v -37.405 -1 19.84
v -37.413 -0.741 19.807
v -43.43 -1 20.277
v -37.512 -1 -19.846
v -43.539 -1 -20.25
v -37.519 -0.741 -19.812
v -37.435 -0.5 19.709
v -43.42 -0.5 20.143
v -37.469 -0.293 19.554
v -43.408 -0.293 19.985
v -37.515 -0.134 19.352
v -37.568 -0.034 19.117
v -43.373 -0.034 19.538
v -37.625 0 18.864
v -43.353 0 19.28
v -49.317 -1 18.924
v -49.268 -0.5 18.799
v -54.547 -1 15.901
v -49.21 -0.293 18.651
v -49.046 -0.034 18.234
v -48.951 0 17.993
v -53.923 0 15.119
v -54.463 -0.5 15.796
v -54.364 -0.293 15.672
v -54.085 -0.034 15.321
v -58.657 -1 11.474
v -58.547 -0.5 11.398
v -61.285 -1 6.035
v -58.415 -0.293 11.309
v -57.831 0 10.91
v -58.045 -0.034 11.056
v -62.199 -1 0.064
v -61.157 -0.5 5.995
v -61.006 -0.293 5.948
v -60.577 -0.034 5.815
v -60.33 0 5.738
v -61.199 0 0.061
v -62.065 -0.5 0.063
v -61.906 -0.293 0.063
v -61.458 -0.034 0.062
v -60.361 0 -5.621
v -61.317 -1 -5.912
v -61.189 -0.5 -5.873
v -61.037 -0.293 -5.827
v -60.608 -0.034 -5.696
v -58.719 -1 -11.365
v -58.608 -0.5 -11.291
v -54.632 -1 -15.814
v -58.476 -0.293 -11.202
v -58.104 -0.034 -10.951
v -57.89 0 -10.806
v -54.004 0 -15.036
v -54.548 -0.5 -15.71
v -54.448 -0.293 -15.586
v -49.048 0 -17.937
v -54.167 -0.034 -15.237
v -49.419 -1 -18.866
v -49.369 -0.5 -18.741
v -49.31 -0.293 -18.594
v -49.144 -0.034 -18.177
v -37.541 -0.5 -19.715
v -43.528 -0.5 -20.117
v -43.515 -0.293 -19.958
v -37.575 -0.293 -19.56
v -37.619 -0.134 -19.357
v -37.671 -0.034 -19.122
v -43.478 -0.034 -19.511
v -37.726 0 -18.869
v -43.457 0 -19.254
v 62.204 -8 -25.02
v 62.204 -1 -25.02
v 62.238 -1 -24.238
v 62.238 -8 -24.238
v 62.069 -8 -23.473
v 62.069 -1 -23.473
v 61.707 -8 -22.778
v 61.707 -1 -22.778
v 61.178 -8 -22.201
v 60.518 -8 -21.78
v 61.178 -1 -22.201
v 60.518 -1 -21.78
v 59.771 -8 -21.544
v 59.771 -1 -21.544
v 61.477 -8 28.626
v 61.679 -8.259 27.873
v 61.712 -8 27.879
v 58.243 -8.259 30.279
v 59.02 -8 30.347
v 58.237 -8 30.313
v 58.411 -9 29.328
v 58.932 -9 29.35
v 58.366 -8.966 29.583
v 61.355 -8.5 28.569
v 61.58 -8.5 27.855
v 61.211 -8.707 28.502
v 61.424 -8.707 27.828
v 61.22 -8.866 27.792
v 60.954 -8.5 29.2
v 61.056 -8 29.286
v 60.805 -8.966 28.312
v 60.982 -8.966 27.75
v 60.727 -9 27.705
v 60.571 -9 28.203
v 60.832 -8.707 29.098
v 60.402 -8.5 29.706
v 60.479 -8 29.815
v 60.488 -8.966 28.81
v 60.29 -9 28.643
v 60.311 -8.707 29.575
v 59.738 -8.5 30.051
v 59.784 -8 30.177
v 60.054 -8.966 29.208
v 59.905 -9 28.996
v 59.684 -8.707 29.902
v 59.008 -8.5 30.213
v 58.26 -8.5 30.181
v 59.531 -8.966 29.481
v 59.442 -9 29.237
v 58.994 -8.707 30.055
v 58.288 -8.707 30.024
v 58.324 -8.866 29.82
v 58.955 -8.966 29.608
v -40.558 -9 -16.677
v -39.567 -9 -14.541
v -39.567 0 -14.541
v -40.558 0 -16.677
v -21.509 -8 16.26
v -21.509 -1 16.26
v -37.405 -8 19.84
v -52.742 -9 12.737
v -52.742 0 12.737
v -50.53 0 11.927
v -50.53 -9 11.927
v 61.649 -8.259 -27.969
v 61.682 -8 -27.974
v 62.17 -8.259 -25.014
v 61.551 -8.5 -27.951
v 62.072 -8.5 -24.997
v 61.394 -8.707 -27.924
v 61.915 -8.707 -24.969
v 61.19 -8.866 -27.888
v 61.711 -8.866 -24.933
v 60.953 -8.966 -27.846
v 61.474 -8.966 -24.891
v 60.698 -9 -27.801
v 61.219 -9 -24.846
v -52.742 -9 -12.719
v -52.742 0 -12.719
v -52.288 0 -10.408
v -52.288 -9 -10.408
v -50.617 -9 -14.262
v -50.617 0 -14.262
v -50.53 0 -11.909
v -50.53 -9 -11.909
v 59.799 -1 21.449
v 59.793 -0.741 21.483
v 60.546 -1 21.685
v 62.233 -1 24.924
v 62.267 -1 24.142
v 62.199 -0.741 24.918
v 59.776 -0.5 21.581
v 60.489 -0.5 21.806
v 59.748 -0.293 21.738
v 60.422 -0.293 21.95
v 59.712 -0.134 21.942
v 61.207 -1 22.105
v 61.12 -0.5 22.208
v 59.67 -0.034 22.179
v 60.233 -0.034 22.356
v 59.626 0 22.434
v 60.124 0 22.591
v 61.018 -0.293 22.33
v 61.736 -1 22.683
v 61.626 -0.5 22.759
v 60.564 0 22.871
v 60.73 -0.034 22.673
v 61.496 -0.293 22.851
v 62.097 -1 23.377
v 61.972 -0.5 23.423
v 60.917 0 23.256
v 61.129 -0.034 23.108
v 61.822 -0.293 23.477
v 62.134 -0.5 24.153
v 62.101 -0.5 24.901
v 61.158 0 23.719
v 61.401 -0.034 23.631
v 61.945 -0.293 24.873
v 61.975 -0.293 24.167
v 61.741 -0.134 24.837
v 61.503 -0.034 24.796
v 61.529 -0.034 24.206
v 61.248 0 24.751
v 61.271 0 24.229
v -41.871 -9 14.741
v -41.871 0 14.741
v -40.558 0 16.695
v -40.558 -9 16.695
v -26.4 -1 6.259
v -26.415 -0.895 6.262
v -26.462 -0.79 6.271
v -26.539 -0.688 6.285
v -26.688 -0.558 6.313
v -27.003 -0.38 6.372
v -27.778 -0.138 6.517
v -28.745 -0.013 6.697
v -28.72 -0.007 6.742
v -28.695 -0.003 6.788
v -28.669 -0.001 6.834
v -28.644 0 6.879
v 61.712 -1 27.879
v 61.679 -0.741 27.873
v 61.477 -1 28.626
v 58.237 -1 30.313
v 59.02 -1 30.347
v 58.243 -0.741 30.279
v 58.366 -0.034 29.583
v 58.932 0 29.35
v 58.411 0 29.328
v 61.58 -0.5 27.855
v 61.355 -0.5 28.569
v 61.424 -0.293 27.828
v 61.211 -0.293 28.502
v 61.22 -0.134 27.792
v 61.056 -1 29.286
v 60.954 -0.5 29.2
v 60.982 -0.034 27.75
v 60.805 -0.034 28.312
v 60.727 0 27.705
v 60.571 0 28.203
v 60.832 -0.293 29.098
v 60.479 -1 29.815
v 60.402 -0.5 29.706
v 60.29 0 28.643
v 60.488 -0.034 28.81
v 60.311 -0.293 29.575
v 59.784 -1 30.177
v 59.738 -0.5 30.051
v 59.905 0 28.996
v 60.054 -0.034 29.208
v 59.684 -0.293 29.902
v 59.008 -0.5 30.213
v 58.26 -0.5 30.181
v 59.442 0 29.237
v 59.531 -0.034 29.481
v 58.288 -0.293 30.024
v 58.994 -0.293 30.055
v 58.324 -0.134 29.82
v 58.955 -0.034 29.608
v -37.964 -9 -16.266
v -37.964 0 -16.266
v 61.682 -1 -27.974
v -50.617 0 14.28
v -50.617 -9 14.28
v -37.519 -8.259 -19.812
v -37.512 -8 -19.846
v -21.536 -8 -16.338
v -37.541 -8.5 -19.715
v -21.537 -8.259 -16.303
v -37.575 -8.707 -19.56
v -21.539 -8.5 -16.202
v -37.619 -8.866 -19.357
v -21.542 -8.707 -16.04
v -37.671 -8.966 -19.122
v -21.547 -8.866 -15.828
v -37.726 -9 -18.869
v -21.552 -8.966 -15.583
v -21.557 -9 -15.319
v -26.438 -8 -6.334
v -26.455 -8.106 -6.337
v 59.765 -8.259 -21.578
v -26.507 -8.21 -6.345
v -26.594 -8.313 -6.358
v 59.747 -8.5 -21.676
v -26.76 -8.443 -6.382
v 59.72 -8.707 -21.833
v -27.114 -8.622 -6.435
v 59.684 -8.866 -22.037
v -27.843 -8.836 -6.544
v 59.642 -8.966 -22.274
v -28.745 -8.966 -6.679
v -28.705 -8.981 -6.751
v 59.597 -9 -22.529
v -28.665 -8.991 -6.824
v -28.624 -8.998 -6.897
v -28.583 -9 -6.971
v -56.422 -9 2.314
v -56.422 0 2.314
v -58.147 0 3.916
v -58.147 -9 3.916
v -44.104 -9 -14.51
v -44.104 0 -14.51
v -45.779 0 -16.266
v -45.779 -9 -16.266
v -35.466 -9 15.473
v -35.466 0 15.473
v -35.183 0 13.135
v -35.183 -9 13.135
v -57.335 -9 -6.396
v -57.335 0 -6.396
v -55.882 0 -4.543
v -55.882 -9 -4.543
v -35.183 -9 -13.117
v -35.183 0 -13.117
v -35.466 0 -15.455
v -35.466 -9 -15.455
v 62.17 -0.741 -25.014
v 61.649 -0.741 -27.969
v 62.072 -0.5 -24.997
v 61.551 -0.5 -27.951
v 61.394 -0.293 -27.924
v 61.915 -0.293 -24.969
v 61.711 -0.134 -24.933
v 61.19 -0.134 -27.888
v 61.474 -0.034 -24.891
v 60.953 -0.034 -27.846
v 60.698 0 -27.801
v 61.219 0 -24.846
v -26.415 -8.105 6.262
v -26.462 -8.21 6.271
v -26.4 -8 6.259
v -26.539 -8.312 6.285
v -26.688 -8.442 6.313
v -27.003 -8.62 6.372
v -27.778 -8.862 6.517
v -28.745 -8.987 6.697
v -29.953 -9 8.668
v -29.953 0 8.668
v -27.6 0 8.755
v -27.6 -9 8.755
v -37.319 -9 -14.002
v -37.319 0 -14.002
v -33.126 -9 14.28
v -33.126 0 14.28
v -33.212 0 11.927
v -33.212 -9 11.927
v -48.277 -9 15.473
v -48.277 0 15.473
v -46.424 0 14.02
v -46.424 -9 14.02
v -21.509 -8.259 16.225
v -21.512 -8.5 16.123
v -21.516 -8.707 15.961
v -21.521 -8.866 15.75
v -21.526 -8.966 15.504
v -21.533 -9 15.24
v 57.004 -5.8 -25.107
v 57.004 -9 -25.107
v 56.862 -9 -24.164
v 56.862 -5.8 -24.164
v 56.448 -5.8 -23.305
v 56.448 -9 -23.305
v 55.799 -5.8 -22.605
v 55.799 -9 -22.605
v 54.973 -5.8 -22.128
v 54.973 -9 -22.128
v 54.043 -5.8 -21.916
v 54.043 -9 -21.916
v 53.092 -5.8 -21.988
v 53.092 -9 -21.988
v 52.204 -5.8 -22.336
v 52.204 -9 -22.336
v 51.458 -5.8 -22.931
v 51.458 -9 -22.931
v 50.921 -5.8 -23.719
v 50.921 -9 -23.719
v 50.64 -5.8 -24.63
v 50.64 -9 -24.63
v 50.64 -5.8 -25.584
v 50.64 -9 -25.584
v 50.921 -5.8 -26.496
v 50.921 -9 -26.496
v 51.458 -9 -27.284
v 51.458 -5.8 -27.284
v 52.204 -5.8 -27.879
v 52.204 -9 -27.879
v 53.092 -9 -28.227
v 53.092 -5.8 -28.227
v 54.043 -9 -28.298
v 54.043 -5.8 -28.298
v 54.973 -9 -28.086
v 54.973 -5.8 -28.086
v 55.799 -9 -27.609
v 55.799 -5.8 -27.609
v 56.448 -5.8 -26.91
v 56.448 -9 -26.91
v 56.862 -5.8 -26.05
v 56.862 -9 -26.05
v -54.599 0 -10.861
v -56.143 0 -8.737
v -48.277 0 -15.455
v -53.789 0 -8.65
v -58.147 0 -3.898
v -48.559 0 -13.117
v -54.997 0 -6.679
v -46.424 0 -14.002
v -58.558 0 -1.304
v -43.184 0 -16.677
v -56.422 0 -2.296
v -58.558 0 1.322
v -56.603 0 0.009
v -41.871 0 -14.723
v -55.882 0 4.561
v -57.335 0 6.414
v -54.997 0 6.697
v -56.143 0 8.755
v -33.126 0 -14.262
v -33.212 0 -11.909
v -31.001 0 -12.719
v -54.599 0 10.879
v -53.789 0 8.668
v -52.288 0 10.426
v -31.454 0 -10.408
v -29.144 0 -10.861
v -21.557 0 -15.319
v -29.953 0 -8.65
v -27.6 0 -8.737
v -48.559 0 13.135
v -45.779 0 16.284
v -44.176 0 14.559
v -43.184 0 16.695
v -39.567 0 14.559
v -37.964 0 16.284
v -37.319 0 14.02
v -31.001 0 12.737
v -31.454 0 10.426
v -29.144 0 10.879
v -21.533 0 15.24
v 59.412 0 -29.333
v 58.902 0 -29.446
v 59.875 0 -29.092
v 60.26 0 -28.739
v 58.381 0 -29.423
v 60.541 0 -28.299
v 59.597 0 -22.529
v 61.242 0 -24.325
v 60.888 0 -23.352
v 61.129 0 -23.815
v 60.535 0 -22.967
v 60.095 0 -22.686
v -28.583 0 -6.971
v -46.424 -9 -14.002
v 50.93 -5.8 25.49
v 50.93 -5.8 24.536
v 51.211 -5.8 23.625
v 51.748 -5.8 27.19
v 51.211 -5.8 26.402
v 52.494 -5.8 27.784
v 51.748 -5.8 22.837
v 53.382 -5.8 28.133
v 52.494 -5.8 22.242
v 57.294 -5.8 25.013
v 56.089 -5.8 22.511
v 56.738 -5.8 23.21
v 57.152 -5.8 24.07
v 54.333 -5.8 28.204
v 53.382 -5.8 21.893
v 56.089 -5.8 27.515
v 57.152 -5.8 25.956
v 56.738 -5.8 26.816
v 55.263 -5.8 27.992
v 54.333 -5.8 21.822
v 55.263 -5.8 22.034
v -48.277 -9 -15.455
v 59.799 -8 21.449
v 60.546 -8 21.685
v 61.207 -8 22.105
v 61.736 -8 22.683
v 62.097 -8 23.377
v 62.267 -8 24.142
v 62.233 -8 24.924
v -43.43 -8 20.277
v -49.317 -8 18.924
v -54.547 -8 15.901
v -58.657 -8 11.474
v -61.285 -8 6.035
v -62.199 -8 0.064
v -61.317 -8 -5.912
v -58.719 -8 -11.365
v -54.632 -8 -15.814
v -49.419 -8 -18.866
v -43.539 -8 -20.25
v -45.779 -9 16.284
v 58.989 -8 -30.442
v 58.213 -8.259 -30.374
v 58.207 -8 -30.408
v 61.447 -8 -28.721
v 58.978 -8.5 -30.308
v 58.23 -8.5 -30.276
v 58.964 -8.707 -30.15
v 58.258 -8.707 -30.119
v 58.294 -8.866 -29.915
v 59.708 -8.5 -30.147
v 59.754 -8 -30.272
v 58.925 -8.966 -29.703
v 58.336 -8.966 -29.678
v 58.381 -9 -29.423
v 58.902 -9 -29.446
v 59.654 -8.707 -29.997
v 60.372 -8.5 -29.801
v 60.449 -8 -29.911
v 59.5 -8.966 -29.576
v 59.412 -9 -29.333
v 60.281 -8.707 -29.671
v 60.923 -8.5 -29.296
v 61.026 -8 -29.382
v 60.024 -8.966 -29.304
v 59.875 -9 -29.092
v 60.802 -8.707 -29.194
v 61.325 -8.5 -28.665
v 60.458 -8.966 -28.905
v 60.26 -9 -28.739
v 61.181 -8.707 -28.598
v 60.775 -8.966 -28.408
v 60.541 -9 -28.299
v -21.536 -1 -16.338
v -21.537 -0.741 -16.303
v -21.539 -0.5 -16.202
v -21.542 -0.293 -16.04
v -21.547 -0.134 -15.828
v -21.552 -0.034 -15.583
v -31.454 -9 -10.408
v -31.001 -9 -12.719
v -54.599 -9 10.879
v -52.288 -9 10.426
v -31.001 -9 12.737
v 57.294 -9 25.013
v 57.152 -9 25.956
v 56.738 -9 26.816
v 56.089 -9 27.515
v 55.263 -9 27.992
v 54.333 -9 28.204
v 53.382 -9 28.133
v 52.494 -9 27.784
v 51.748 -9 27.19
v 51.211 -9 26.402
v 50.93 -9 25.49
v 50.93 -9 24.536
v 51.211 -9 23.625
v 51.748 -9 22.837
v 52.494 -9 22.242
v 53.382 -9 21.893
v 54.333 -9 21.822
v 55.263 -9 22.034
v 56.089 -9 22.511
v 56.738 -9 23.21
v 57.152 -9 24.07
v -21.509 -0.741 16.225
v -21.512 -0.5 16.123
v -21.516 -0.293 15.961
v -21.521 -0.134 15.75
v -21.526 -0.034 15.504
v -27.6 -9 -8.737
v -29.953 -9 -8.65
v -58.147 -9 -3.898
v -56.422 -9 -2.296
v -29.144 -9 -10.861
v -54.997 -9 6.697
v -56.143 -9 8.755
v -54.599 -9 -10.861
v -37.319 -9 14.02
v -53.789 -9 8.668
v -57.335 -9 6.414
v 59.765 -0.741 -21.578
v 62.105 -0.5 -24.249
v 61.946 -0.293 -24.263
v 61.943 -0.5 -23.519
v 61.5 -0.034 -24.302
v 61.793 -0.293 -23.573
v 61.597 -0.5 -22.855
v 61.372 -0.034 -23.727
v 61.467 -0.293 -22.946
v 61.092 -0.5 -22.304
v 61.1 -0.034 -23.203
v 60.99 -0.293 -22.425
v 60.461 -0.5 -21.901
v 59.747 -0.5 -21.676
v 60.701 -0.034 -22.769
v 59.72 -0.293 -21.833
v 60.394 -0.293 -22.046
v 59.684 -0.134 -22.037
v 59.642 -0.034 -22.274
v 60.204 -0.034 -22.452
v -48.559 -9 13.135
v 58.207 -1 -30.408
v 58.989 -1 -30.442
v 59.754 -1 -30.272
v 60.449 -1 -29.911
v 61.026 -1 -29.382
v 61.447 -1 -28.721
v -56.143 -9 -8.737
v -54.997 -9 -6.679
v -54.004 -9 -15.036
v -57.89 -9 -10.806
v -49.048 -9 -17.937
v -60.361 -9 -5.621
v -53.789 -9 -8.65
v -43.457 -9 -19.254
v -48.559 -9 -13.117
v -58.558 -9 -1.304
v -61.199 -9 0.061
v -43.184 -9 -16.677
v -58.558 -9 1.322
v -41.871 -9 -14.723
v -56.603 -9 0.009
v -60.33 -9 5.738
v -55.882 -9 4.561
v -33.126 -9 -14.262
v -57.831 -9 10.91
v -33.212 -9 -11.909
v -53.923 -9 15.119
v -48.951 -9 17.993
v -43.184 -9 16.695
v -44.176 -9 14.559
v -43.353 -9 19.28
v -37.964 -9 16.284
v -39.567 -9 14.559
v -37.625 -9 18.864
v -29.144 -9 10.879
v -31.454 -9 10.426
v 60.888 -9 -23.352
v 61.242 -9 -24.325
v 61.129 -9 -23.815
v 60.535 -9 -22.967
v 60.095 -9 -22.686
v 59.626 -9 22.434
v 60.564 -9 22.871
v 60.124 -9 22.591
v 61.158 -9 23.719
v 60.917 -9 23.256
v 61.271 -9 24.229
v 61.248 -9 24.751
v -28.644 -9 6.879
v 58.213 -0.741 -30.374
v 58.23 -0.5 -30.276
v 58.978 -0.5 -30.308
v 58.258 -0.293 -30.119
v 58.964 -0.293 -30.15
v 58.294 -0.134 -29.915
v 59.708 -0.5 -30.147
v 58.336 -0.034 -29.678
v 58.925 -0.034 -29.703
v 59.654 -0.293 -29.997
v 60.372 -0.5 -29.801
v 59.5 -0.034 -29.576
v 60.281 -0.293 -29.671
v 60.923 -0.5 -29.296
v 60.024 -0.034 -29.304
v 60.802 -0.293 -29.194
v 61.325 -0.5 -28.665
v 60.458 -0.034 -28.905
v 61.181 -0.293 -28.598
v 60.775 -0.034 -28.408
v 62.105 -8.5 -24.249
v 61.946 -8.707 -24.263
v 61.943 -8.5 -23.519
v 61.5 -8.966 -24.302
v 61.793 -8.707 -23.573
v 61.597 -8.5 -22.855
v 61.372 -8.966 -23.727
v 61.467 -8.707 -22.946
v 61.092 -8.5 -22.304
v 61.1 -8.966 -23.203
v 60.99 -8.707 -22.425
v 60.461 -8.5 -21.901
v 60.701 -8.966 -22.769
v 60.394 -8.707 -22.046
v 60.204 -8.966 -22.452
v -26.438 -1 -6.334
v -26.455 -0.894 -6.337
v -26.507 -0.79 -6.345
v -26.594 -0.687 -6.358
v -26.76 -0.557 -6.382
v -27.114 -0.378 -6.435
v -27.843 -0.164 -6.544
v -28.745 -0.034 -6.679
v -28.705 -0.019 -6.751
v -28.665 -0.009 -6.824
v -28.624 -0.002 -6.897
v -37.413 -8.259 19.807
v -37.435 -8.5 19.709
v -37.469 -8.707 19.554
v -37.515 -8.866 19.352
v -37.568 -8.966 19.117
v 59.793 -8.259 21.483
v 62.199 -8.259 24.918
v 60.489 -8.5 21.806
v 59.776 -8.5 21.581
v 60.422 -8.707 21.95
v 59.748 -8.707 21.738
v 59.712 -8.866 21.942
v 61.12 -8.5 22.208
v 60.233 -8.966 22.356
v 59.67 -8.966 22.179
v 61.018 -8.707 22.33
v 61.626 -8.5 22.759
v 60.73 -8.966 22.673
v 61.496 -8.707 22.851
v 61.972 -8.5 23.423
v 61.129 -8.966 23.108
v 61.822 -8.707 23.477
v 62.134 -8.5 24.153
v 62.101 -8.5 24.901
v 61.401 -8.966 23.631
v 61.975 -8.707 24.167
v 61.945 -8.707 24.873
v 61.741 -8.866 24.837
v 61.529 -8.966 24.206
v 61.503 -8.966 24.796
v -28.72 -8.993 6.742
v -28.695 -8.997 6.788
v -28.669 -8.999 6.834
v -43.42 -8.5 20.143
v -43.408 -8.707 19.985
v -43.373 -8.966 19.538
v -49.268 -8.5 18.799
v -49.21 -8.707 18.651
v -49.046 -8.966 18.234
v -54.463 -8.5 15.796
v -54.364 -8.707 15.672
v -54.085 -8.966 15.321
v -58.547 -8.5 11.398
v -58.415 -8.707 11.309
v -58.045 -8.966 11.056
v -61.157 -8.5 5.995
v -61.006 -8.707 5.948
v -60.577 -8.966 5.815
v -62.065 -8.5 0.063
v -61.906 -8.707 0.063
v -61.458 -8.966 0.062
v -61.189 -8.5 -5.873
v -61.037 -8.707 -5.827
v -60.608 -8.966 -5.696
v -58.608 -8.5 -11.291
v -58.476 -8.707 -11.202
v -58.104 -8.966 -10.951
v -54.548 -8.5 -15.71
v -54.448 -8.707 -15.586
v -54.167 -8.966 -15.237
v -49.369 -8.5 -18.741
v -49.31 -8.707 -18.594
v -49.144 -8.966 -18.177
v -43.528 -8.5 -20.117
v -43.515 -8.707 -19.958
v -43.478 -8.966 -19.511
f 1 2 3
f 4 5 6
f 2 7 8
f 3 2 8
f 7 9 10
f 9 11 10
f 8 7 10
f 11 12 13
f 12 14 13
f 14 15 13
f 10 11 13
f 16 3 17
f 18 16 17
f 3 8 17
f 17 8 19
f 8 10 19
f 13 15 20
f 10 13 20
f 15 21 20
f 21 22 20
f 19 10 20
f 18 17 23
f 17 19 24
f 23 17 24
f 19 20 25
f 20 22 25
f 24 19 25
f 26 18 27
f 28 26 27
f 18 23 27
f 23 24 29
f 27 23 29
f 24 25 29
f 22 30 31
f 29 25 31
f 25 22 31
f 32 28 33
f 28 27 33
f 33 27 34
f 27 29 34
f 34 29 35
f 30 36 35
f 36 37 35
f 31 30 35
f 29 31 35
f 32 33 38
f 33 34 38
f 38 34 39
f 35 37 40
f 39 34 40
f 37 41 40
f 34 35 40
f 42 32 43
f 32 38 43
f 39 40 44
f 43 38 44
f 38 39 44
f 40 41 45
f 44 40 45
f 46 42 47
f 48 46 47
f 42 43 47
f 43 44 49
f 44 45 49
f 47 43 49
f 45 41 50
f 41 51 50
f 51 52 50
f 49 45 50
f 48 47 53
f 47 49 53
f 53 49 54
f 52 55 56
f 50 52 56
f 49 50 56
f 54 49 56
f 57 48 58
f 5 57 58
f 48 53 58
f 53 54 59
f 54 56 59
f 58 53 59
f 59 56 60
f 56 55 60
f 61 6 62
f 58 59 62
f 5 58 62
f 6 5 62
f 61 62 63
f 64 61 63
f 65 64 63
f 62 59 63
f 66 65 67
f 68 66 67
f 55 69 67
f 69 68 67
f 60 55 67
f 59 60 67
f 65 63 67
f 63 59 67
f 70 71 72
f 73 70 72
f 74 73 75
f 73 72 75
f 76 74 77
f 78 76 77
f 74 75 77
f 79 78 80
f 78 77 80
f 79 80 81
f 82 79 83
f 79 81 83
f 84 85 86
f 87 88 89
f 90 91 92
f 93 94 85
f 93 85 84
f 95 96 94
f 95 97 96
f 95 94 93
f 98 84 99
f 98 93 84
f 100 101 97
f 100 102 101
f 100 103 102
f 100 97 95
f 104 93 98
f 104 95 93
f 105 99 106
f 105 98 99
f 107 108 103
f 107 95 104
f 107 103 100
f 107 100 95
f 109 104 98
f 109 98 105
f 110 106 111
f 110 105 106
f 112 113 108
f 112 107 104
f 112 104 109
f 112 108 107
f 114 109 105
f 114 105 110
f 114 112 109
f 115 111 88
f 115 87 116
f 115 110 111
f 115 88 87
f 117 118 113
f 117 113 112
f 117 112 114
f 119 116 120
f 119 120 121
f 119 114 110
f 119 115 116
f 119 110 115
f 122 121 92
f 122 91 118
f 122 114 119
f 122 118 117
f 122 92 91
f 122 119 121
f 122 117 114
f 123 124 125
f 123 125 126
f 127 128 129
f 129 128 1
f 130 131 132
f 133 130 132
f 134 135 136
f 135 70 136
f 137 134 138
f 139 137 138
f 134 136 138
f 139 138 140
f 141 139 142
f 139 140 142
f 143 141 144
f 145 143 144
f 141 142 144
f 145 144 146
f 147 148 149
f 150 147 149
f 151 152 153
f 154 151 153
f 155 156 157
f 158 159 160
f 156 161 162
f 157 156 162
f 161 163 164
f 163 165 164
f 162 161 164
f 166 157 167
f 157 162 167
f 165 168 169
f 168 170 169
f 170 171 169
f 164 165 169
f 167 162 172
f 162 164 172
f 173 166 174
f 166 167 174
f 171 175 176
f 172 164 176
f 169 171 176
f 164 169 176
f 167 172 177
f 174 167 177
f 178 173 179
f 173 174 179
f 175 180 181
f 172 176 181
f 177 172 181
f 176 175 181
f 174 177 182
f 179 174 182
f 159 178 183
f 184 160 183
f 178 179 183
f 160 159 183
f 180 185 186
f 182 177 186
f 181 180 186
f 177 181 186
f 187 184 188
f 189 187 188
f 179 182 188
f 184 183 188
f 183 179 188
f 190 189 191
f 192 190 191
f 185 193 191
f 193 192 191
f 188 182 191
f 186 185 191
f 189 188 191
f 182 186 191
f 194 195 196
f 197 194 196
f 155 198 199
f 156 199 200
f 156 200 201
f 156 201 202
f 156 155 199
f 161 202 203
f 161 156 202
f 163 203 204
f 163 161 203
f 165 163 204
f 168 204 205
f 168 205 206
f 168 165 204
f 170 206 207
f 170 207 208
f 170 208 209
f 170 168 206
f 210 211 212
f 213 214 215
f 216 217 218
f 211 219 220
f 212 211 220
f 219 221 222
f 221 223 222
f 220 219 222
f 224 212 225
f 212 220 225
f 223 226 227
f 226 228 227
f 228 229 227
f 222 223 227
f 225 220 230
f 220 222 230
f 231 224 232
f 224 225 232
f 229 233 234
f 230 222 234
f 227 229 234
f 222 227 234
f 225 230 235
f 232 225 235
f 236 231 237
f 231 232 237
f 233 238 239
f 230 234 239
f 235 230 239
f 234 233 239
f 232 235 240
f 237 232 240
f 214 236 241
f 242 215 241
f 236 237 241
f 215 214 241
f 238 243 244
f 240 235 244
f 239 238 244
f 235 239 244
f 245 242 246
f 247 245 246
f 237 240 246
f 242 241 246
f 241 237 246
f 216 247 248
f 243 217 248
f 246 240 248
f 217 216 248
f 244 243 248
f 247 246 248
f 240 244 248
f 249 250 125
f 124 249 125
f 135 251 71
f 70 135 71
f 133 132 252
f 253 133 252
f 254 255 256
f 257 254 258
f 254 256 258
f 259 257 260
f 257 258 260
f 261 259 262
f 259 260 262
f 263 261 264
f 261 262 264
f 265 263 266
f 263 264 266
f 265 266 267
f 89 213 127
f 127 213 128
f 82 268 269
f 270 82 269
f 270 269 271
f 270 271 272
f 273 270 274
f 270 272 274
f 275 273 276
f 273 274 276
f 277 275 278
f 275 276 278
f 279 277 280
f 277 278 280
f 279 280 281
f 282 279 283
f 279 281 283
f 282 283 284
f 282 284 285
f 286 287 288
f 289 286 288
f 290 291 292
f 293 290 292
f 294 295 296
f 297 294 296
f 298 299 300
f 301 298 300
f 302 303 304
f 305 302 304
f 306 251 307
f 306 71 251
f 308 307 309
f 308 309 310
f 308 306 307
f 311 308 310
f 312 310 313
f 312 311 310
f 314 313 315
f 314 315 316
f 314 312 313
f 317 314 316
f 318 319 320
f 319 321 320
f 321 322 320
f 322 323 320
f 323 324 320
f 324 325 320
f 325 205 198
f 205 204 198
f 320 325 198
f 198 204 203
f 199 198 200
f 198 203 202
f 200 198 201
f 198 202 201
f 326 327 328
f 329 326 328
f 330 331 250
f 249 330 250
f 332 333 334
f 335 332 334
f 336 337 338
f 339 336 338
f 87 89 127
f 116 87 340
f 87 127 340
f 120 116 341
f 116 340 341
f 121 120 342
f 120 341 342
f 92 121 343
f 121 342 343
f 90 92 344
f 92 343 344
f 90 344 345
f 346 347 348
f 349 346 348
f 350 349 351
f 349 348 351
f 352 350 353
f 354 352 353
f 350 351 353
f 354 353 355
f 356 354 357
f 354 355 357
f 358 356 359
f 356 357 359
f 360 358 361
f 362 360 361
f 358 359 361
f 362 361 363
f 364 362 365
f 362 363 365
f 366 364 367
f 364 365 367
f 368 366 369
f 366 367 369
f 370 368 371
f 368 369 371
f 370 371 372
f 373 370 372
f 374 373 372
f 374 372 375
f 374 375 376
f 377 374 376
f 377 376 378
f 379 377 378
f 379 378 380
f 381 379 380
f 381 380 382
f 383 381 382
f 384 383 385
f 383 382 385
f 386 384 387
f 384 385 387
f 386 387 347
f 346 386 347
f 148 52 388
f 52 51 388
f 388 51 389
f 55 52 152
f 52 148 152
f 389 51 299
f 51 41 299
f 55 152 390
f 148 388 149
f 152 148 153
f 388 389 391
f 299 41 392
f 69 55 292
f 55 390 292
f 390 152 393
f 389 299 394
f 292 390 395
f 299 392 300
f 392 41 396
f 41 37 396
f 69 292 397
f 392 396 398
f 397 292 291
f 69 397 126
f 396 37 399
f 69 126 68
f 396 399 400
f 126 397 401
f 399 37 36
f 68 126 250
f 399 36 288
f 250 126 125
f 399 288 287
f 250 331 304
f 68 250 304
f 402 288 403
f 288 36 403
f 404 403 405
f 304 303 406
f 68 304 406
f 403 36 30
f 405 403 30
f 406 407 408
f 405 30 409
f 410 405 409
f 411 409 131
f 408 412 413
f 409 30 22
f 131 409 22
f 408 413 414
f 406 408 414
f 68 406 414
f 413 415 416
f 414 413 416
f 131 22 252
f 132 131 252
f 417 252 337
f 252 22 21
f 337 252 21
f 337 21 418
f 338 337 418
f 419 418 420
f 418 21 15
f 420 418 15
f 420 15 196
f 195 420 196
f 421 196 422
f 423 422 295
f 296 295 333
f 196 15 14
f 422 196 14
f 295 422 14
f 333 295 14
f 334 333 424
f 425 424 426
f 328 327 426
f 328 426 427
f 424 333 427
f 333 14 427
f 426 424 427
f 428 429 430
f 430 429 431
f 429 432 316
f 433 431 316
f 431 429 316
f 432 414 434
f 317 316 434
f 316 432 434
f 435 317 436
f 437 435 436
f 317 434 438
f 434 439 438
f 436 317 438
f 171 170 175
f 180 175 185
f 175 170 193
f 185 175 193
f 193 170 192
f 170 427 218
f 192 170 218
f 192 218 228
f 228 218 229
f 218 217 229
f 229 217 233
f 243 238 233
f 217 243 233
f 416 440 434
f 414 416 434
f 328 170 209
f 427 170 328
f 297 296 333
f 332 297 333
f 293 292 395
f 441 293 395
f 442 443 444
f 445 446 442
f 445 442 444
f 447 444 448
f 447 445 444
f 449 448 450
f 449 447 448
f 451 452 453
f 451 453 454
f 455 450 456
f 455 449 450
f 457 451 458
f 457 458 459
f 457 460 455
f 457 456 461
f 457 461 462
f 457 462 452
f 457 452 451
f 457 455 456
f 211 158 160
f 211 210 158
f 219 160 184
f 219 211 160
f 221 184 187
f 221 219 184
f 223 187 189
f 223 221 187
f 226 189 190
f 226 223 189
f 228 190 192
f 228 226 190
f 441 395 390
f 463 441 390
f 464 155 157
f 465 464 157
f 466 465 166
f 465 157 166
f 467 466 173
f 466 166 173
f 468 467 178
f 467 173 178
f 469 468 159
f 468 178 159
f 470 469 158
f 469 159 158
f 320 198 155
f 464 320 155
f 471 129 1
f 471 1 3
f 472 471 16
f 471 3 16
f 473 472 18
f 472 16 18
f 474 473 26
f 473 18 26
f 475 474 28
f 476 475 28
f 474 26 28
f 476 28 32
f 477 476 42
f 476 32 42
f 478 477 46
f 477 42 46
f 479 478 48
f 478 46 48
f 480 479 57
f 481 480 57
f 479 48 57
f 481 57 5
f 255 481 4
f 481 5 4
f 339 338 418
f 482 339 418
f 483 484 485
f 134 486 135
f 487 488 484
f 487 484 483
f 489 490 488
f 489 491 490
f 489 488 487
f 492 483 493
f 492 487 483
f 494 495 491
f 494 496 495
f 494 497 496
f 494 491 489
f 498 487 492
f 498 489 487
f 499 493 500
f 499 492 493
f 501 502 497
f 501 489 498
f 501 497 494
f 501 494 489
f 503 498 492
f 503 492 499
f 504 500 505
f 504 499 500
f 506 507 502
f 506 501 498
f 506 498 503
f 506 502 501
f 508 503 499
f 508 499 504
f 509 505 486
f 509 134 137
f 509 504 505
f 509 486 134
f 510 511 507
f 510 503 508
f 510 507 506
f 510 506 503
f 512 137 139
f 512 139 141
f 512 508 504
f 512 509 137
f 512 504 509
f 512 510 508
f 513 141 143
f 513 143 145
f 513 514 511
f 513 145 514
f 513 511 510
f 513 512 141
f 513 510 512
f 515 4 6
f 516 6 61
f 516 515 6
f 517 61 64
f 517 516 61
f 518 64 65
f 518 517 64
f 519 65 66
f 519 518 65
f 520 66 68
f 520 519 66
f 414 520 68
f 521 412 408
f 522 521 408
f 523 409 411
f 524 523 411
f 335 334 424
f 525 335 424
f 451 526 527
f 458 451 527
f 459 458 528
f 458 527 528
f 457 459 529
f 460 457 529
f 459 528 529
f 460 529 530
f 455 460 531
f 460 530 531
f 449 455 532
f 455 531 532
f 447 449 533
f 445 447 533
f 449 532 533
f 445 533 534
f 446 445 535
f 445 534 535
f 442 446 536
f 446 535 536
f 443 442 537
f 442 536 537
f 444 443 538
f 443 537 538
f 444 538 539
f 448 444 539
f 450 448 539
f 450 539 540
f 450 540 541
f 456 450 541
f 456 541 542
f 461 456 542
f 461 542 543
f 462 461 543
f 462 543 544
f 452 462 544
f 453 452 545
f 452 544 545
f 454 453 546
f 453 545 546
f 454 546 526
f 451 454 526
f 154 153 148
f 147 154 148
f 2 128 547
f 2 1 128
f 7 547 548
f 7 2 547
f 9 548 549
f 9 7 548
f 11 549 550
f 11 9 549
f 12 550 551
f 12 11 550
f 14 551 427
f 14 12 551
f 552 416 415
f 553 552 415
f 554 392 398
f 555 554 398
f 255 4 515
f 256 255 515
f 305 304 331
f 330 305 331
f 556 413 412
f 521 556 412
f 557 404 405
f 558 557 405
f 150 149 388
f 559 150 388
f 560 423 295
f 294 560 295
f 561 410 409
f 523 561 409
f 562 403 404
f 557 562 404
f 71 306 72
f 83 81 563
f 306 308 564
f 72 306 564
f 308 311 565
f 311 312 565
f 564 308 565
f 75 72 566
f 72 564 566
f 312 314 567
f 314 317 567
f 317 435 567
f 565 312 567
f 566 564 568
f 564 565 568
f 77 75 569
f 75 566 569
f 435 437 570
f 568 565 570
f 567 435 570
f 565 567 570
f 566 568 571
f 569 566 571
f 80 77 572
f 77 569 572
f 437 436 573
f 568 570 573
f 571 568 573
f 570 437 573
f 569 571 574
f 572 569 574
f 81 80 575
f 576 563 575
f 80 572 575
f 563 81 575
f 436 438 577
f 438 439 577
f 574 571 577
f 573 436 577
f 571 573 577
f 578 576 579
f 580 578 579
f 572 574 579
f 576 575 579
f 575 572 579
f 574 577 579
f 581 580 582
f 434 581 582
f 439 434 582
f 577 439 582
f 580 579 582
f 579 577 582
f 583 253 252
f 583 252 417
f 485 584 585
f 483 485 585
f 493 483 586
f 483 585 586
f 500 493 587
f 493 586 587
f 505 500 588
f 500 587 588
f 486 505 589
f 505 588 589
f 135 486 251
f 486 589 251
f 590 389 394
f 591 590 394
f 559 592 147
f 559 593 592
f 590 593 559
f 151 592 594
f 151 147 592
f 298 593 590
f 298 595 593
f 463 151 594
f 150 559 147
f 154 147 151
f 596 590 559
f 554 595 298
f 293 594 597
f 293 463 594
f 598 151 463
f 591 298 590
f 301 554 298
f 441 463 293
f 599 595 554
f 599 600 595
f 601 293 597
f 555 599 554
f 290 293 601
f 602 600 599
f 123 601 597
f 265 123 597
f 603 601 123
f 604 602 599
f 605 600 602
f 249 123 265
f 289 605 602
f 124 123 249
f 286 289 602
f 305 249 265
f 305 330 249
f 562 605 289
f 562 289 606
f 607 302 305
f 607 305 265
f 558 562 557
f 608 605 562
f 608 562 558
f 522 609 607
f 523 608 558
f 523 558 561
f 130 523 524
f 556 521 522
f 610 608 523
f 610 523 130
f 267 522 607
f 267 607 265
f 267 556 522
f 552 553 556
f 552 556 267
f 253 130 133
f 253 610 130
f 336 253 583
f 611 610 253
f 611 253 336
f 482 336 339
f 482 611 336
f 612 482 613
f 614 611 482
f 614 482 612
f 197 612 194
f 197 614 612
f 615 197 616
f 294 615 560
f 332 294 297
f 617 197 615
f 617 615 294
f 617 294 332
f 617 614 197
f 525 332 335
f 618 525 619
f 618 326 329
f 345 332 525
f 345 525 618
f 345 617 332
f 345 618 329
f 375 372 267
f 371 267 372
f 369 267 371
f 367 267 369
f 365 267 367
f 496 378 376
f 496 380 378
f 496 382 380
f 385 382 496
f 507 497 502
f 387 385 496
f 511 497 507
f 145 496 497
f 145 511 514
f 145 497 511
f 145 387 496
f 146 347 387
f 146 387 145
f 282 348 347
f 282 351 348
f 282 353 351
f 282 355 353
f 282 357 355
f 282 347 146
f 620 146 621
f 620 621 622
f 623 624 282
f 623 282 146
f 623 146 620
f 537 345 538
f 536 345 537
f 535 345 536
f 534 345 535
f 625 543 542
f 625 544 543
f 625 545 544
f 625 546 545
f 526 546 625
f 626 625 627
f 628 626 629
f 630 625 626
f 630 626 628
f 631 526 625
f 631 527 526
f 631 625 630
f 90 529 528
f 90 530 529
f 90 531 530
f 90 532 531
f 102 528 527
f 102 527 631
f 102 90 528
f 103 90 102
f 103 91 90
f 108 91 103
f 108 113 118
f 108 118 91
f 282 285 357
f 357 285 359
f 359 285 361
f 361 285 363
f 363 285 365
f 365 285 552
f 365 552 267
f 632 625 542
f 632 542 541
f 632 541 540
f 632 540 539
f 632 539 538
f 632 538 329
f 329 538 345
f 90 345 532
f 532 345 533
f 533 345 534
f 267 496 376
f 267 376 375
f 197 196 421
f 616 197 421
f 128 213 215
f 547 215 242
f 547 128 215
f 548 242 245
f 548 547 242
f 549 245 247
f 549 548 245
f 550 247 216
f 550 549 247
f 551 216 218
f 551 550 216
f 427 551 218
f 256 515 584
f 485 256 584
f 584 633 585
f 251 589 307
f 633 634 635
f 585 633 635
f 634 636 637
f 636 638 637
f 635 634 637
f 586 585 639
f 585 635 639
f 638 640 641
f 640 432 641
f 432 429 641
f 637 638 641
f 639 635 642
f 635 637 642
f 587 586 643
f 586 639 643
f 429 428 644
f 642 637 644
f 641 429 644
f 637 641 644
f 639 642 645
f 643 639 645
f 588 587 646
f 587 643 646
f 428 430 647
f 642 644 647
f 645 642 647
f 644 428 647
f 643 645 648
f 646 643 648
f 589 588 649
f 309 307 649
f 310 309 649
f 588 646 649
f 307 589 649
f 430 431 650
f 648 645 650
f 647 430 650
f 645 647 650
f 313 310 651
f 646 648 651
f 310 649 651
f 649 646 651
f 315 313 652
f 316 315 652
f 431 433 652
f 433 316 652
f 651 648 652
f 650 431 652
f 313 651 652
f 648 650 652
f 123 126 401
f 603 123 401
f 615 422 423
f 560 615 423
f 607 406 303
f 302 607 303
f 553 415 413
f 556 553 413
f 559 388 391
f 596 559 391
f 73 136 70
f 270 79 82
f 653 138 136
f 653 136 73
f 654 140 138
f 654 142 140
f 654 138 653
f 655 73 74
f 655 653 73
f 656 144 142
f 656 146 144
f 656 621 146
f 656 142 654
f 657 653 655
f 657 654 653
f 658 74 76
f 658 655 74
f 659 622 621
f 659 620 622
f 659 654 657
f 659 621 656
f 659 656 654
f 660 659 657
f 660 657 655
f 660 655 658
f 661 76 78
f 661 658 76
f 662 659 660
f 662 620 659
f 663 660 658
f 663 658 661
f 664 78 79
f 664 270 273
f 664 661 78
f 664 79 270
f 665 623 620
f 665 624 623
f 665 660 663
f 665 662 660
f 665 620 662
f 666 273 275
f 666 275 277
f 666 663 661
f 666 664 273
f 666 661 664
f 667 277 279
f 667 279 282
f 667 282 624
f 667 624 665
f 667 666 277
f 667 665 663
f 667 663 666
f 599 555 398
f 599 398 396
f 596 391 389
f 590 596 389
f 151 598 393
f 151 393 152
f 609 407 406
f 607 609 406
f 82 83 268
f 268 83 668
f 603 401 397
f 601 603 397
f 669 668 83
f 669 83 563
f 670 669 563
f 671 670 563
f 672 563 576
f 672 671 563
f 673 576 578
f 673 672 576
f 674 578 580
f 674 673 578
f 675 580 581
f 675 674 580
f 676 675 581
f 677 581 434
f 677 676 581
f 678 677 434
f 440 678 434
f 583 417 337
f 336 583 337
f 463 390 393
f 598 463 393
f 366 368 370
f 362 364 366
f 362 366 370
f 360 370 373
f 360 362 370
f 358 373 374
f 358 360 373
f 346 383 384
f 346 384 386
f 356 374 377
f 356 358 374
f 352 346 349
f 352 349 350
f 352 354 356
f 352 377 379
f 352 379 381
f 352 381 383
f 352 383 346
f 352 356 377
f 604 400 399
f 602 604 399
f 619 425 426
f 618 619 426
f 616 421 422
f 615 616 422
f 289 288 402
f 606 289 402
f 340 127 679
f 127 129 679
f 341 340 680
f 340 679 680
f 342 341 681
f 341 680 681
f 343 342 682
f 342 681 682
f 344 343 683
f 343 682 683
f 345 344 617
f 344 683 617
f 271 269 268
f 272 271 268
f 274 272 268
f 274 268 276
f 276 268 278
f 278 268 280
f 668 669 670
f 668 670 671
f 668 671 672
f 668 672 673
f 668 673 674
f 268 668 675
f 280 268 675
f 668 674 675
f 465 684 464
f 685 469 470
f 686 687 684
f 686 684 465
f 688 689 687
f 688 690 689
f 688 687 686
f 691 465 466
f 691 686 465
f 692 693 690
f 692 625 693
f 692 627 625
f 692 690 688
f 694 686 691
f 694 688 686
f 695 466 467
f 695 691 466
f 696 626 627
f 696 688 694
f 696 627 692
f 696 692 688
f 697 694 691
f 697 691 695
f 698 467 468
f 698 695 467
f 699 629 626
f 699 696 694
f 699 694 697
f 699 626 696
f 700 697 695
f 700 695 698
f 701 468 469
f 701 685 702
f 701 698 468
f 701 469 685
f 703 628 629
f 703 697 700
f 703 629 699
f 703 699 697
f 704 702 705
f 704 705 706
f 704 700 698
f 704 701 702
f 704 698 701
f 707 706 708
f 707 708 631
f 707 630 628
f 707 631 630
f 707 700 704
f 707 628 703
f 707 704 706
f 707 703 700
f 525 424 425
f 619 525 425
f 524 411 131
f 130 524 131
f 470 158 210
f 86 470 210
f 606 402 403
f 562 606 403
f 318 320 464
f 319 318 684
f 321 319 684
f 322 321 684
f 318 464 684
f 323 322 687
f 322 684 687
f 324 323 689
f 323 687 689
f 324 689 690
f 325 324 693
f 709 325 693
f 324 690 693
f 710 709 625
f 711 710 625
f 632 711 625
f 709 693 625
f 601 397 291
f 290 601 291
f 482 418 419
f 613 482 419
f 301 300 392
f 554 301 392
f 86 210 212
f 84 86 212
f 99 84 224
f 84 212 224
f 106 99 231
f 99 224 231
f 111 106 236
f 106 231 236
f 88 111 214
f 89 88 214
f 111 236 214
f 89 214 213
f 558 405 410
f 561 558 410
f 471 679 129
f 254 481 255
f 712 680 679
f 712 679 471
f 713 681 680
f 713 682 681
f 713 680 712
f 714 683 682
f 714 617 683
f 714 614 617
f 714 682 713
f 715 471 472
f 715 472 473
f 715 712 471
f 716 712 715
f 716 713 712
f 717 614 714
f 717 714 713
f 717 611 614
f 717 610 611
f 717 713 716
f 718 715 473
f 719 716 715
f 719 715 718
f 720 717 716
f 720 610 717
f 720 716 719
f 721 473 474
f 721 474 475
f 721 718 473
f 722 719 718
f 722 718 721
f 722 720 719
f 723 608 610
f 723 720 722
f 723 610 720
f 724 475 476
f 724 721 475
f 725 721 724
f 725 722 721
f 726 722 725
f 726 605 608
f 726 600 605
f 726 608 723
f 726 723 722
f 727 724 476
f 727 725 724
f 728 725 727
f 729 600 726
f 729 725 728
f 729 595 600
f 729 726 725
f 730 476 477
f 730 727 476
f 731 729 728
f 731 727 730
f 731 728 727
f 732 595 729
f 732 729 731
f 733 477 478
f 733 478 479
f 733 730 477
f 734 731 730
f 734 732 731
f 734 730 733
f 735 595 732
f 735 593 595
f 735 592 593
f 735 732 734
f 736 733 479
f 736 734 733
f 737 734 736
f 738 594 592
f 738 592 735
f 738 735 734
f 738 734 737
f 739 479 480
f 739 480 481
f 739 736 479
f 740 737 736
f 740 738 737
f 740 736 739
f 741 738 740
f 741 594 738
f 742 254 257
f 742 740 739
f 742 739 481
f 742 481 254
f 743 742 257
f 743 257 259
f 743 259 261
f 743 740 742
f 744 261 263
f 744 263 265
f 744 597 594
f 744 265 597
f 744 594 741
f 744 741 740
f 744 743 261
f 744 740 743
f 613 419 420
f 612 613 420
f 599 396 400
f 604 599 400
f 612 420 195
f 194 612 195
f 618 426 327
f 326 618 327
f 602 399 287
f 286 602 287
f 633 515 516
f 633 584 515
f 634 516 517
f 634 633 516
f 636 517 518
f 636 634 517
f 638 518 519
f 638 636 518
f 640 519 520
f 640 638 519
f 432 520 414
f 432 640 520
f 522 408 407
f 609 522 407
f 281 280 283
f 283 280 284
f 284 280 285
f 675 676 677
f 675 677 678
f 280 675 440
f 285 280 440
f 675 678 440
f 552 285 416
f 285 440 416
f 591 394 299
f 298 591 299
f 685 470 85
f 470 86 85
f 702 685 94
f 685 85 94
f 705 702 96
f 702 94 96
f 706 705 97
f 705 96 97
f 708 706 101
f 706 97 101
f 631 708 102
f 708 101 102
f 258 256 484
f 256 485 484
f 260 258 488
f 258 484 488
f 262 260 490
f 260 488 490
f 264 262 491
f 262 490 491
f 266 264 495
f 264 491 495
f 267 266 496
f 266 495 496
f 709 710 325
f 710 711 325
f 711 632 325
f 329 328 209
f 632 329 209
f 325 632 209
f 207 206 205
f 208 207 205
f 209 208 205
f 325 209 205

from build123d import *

# Parameters (mm, degrees)
F1_DEPTH = 9
F2_R     = 1
F3_R     = 3.2
F4_DEPTH = 3.2


with BuildPart() as f1:
    # F0 (on Front) → F1 (new body)
    with BuildSketch(Plane.XZ):
        with BuildLine():
            Line((58.237216, 30.312542), (-21.508595, 16.259921))
            Line((-21.508595, 16.259921), (-37.405091, 19.839976))
            ThreePointArc((-37.405091, 19.839976), (-62.198849, 0.063682), (-37.511886, -19.845765))
            Line((-37.511886, -19.845765), (-21.53597, -16.33806))
            Line((-21.53597, -16.33806), (58.206859, -30.407589))
            ThreePointArc((58.206859, -30.407589), (60.448586, -29.91086), (61.682485, -27.974479))
            Line((61.682485, -27.974479), (62.203743, -25.020111))
            ThreePointArc((62.203743, -25.020111), (61.707013, -22.778385), (59.770632, -21.544485))
            Line((59.770632, -21.544485), (-26.437625, -6.334219))
            Line((-26.437625, -6.334219), (-28.745186, -6.679076))
            Line((-28.745186, -6.679076), (-27.599835, -8.736546))
            Line((-27.599835, -8.736546), (-29.953032, -8.650102))
            Line((-29.953032, -8.650102), (-29.143641, -10.861413))
            Line((-29.143641, -10.861413), (-31.454344, -10.407912))
            Line((-31.454344, -10.407912), (-31.000843, -12.718615))
            Line((-31.000843, -12.718615), (-33.212154, -11.909224))
            Line((-33.212154, -11.909224), (-33.12571, -14.262421))
            Line((-33.12571, -14.262421), (-35.183179, -13.11707))
            Line((-35.183179, -13.11707), (-35.465921, -15.454818))
            Line((-35.465921, -15.454818), (-37.318887, -14.001709))
            Line((-37.318887, -14.001709), (-37.963852, -16.266445))
            Line((-37.963852, -16.266445), (-39.566689, -14.541358))
            Line((-39.566689, -14.541358), (-40.557996, -16.677317))
            Line((-40.557996, -16.677317), (-41.871236, -14.72273))
            Line((-41.871236, -14.72273), (-43.184476, -16.677317))
            Line((-43.184476, -16.677317), (-44.104438, -14.509645))
            Line((-44.104438, -14.509645), (-45.77862, -16.266445))
            Line((-45.77862, -16.266445), (-46.423584, -14.001709))
            Line((-46.423584, -14.001709), (-48.276551, -15.454818))
            Line((-48.276551, -15.454818), (-48.559292, -13.11707))
            Line((-48.559292, -13.11707), (-50.616762, -14.262421))
            Line((-50.616762, -14.262421), (-50.530318, -11.909224))
            Line((-50.530318, -11.909224), (-52.741629, -12.718615))
            Line((-52.741629, -12.718615), (-52.288128, -10.407912))
            Line((-52.288128, -10.407912), (-54.59883, -10.861413))
            Line((-54.59883, -10.861413), (-53.789439, -8.650102))
            Line((-53.789439, -8.650102), (-56.142637, -8.736546))
            Line((-56.142637, -8.736546), (-54.997285, -6.679076))
            Line((-54.997285, -6.679076), (-57.335034, -6.396335))
            Line((-57.335034, -6.396335), (-55.881924, -4.543369))
            Line((-55.881924, -4.543369), (-58.146661, -3.898404))
            Line((-58.146661, -3.898404), (-56.421574, -2.295567))
            Line((-56.421574, -2.295567), (-58.557533, -1.30426))
            Line((-58.557533, -1.30426), (-56.602946, 0.00898))
            Line((-56.602946, 0.00898), (-58.557533, 1.32222))
            Line((-58.557533, 1.32222), (-56.421574, 2.313527))
            Line((-56.421574, 2.313527), (-58.146661, 3.916364))
            Line((-58.146661, 3.916364), (-55.881924, 4.561329))
            Line((-55.881924, 4.561329), (-57.335034, 6.414295))
            Line((-57.335034, 6.414295), (-54.997285, 6.697036))
            Line((-54.997285, 6.697036), (-56.142637, 8.754506))
            Line((-56.142637, 8.754506), (-53.789439, 8.668062))
            Line((-53.789439, 8.668062), (-54.59883, 10.879373))
            Line((-54.59883, 10.879373), (-52.288128, 10.425872))
            Line((-52.288128, 10.425872), (-52.741629, 12.736575))
            Line((-52.741629, 12.736575), (-50.530318, 11.927184))
            Line((-50.530318, 11.927184), (-50.616762, 14.280381))
            Line((-50.616762, 14.280381), (-48.559292, 13.13503))
            Line((-48.559292, 13.13503), (-48.276551, 15.472778))
            Line((-48.276551, 15.472778), (-46.423584, 14.019669))
            Line((-46.423584, 14.019669), (-45.77862, 16.284405))
            Line((-45.77862, 16.284405), (-44.175783, 14.559318))
            Line((-44.175783, 14.559318), (-43.184476, 16.695277))
            Line((-43.184476, 16.695277), (-41.871236, 14.74069))
            Line((-41.871236, 14.74069), (-40.557996, 16.695277))
            Line((-40.557996, 16.695277), (-39.566689, 14.559318))
            Line((-39.566689, 14.559318), (-37.963852, 16.284405))
            Line((-37.963852, 16.284405), (-37.318887, 14.019669))
            Line((-37.318887, 14.019669), (-35.465921, 15.472778))
            Line((-35.465921, 15.472778), (-35.183179, 13.13503))
            Line((-35.183179, 13.13503), (-33.12571, 14.280381))
            Line((-33.12571, 14.280381), (-33.212154, 11.927184))
            Line((-33.212154, 11.927184), (-31.000843, 12.736575))
            Line((-31.000843, 12.736575), (-31.454344, 10.425872))
            Line((-31.454344, 10.425872), (-29.143641, 10.879373))
            Line((-29.143641, 10.879373), (-29.953032, 8.668062))
            Line((-29.953032, 8.668062), (-27.599835, 8.754506))
            Line((-27.599835, 8.754506), (-28.745186, 6.697036))
            Line((-28.745186, 6.697036), (-26.399793, 6.259337))
            Line((-26.399793, 6.259337), (59.79911, 21.449106))
            ThreePointArc((59.79911, 21.449106), (61.735753, 22.682595), (62.232957, 24.924216))
            Line((62.232957, 24.924216), (61.712326, 27.878694))
            ThreePointArc((61.712326, 27.878694), (60.478837, 29.815337), (58.237216, 30.312542))
        make_face()
    extrude(amount=F1_DEPTH)

    # F2
    f2_edges = [f1.edges().sort_by_distance(p)[0] for p in [
        (18.335444, -9, -23.372825),
        (-62.198849, -9, 0.063682),
        (18.364311, -9, 23.286231),
        (18.335444, 0, -23.372825),
        (18.364311, 0, 23.286231),
        (-62.198849, 0, 0.063682),
    ]]
    fillet(f2_edges, radius=F2_R)

    # F3 (on face) → F4 (cut)
    with BuildSketch(Plane.XZ.offset(9)):
        with Locations((54.094032, 25.013105)):
            Circle(F3_R)
        with Locations((53.80417, -25.107275)):
            Circle(F3_R)
    extrude(amount=-F4_DEPTH, mode=Mode.SUBTRACT)


solid = f1.part
